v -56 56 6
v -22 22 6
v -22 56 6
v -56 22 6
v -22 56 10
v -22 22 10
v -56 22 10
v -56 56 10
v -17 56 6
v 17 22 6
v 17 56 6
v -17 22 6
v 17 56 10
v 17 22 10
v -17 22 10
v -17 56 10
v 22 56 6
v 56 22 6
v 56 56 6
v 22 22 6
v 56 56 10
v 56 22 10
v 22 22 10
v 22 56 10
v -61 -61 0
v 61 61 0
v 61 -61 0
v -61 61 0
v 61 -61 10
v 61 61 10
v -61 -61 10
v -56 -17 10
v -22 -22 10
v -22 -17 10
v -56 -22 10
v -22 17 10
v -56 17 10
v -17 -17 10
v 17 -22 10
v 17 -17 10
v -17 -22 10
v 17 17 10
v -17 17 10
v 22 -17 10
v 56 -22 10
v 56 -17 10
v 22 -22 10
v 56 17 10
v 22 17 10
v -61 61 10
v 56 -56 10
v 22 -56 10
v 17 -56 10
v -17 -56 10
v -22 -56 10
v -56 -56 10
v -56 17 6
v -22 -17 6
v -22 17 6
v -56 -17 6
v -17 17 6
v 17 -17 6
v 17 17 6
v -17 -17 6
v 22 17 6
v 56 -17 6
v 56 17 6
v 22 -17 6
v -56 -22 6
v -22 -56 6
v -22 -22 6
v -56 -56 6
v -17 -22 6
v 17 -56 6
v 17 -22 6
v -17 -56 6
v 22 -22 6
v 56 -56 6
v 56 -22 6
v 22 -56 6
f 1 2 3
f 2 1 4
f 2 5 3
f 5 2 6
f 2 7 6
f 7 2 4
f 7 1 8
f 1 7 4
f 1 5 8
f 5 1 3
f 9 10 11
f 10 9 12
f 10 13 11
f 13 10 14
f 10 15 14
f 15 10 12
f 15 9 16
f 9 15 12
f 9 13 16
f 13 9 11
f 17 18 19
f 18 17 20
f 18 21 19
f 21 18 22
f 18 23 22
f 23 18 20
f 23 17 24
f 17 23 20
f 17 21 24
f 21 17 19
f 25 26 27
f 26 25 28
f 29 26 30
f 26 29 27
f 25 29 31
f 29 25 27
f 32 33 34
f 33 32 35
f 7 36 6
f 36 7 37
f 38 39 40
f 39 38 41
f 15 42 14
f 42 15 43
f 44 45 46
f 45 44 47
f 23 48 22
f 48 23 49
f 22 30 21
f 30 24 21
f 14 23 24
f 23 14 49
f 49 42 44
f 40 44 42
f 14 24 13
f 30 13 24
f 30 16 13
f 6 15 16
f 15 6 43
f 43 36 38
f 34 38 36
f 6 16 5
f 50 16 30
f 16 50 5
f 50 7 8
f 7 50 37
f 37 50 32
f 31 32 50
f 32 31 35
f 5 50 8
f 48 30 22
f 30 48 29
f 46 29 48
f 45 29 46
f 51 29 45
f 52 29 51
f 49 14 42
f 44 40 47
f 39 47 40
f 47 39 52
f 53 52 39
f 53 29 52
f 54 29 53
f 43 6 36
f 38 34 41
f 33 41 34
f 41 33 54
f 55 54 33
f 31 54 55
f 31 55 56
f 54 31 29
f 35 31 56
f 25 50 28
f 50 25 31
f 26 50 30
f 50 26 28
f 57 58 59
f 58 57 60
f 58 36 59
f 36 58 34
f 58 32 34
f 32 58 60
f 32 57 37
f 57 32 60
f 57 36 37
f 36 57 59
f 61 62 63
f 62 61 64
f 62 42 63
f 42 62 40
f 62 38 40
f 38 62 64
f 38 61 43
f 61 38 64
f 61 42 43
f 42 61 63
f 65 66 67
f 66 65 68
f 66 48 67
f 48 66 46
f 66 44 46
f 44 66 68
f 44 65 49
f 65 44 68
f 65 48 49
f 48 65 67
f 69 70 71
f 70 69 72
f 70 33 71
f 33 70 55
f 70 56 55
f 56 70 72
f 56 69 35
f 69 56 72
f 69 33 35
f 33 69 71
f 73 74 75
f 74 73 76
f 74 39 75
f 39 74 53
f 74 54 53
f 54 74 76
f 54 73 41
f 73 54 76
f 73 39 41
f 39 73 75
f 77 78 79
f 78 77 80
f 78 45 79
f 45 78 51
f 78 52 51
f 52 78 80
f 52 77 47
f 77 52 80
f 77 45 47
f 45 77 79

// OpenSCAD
difference()
{
    difference()
    {
        difference()
        {
            linear_extrude(height = 10.0, twist = 0.0, scale = 1.0, slices = 1, center = false)
            {
                scale([122.0, 122.0])
                {
                    M8();
                }
            }
            union()
            {
                union()
                {
                    translate([-39.0, 39.0, 6.0])
                    {
                        linear_extrude(height = 20.0, twist = 0.0, scale = 1.0, slices = 1, center = false)
                        {
                            scale([34.0, 34.0])
                            {
                                M8();
                            }
                        }
                    }
                    translate([39.0, 0.0, 0.0])
                    {
                        translate([-39.0, 39.0, 6.0])
                        {
                            linear_extrude(height = 20.0, twist = 0.0, scale = 1.0, slices = 1, center = false)
                            {
                                scale([34.0, 34.0])
                                {
                                    M8();
                                }
                            }
                        }
                    }
                }
                translate([39.0, 0.0, 0.0])
                {
                    translate([39.0, 0.0, 0.0])
                    {
                        translate([-39.0, 39.0, 6.0])
                        {
                            linear_extrude(height = 20.0, twist = 0.0, scale = 1.0, slices = 1, center = false)
                            {
                                scale([34.0, 34.0])
                                {
                                    M8();
                                }
                            }
                        }
                    }
                }
            }
        }
        translate([0.0, -39.0, 0.0])
        {
            union()
            {
                union()
                {
                    translate([-39.0, 39.0, 6.0])
                    {
                        linear_extrude(height = 20.0, twist = 0.0, scale = 1.0, slices = 1, center = false)
                        {
                            scale([34.0, 34.0])
                            {
                                M8();
                            }
                        }
                    }
                    translate([39.0, 0.0, 0.0])
                    {
                        translate([-39.0, 39.0, 6.0])
                        {
                            linear_extrude(height = 20.0, twist = 0.0, scale = 1.0, slices = 1, center = false)
                            {
                                scale([34.0, 34.0])
                                {
                                    M8();
                                }
                            }
                        }
                    }
                }
                translate([39.0, 0.0, 0.0])
                {
                    translate([39.0, 0.0, 0.0])
                    {
                        translate([-39.0, 39.0, 6.0])
                        {
                            linear_extrude(height = 20.0, twist = 0.0, scale = 1.0, slices = 1, center = false)
                            {
                                scale([34.0, 34.0])
                                {
                                    M8();
                                }
                            }
                        }
                    }
                }
            }
        }
    }
    translate([0.0, -78.0, 0.0])
    {
        union()
        {
            union()
            {
                translate([-39.0, 39.0, 6.0])
                {
                    linear_extrude(height = 20.0, twist = 0.0, scale = 1.0, slices = 1, center = false)
                    {
                        scale([34.0, 34.0])
                        {
                            M8();
                        }
                    }
                }
                translate([39.0, 0.0, 0.0])
                {
                    translate([-39.0, 39.0, 6.0])
                    {
                        linear_extrude(height = 20.0, twist = 0.0, scale = 1.0, slices = 1, center = false)
                        {
                            scale([34.0, 34.0])
                            {
                                M8();
                            }
                        }
                    }
                }
            }
            translate([39.0, 0.0, 0.0])
            {
                translate([39.0, 0.0, 0.0])
                {
                    translate([-39.0, 39.0, 6.0])
                    {
                        linear_extrude(height = 20.0, twist = 0.0, scale = 1.0, slices = 1, center = false)
                        {
                            scale([34.0, 34.0])
                            {
                                M8();
                            }
                        }
                    }
                }
            }
        }
    }
}

module M8()
{
    polygon
    (
        points =
        [
            [-0.5, -0.5], 
            [0.5, -0.5], 
            [0.5, 0.5], 
            [-0.5, 0.5]
        ],
        paths =
        [
            [0, 1, 2, 3]
        ]
    );
}
